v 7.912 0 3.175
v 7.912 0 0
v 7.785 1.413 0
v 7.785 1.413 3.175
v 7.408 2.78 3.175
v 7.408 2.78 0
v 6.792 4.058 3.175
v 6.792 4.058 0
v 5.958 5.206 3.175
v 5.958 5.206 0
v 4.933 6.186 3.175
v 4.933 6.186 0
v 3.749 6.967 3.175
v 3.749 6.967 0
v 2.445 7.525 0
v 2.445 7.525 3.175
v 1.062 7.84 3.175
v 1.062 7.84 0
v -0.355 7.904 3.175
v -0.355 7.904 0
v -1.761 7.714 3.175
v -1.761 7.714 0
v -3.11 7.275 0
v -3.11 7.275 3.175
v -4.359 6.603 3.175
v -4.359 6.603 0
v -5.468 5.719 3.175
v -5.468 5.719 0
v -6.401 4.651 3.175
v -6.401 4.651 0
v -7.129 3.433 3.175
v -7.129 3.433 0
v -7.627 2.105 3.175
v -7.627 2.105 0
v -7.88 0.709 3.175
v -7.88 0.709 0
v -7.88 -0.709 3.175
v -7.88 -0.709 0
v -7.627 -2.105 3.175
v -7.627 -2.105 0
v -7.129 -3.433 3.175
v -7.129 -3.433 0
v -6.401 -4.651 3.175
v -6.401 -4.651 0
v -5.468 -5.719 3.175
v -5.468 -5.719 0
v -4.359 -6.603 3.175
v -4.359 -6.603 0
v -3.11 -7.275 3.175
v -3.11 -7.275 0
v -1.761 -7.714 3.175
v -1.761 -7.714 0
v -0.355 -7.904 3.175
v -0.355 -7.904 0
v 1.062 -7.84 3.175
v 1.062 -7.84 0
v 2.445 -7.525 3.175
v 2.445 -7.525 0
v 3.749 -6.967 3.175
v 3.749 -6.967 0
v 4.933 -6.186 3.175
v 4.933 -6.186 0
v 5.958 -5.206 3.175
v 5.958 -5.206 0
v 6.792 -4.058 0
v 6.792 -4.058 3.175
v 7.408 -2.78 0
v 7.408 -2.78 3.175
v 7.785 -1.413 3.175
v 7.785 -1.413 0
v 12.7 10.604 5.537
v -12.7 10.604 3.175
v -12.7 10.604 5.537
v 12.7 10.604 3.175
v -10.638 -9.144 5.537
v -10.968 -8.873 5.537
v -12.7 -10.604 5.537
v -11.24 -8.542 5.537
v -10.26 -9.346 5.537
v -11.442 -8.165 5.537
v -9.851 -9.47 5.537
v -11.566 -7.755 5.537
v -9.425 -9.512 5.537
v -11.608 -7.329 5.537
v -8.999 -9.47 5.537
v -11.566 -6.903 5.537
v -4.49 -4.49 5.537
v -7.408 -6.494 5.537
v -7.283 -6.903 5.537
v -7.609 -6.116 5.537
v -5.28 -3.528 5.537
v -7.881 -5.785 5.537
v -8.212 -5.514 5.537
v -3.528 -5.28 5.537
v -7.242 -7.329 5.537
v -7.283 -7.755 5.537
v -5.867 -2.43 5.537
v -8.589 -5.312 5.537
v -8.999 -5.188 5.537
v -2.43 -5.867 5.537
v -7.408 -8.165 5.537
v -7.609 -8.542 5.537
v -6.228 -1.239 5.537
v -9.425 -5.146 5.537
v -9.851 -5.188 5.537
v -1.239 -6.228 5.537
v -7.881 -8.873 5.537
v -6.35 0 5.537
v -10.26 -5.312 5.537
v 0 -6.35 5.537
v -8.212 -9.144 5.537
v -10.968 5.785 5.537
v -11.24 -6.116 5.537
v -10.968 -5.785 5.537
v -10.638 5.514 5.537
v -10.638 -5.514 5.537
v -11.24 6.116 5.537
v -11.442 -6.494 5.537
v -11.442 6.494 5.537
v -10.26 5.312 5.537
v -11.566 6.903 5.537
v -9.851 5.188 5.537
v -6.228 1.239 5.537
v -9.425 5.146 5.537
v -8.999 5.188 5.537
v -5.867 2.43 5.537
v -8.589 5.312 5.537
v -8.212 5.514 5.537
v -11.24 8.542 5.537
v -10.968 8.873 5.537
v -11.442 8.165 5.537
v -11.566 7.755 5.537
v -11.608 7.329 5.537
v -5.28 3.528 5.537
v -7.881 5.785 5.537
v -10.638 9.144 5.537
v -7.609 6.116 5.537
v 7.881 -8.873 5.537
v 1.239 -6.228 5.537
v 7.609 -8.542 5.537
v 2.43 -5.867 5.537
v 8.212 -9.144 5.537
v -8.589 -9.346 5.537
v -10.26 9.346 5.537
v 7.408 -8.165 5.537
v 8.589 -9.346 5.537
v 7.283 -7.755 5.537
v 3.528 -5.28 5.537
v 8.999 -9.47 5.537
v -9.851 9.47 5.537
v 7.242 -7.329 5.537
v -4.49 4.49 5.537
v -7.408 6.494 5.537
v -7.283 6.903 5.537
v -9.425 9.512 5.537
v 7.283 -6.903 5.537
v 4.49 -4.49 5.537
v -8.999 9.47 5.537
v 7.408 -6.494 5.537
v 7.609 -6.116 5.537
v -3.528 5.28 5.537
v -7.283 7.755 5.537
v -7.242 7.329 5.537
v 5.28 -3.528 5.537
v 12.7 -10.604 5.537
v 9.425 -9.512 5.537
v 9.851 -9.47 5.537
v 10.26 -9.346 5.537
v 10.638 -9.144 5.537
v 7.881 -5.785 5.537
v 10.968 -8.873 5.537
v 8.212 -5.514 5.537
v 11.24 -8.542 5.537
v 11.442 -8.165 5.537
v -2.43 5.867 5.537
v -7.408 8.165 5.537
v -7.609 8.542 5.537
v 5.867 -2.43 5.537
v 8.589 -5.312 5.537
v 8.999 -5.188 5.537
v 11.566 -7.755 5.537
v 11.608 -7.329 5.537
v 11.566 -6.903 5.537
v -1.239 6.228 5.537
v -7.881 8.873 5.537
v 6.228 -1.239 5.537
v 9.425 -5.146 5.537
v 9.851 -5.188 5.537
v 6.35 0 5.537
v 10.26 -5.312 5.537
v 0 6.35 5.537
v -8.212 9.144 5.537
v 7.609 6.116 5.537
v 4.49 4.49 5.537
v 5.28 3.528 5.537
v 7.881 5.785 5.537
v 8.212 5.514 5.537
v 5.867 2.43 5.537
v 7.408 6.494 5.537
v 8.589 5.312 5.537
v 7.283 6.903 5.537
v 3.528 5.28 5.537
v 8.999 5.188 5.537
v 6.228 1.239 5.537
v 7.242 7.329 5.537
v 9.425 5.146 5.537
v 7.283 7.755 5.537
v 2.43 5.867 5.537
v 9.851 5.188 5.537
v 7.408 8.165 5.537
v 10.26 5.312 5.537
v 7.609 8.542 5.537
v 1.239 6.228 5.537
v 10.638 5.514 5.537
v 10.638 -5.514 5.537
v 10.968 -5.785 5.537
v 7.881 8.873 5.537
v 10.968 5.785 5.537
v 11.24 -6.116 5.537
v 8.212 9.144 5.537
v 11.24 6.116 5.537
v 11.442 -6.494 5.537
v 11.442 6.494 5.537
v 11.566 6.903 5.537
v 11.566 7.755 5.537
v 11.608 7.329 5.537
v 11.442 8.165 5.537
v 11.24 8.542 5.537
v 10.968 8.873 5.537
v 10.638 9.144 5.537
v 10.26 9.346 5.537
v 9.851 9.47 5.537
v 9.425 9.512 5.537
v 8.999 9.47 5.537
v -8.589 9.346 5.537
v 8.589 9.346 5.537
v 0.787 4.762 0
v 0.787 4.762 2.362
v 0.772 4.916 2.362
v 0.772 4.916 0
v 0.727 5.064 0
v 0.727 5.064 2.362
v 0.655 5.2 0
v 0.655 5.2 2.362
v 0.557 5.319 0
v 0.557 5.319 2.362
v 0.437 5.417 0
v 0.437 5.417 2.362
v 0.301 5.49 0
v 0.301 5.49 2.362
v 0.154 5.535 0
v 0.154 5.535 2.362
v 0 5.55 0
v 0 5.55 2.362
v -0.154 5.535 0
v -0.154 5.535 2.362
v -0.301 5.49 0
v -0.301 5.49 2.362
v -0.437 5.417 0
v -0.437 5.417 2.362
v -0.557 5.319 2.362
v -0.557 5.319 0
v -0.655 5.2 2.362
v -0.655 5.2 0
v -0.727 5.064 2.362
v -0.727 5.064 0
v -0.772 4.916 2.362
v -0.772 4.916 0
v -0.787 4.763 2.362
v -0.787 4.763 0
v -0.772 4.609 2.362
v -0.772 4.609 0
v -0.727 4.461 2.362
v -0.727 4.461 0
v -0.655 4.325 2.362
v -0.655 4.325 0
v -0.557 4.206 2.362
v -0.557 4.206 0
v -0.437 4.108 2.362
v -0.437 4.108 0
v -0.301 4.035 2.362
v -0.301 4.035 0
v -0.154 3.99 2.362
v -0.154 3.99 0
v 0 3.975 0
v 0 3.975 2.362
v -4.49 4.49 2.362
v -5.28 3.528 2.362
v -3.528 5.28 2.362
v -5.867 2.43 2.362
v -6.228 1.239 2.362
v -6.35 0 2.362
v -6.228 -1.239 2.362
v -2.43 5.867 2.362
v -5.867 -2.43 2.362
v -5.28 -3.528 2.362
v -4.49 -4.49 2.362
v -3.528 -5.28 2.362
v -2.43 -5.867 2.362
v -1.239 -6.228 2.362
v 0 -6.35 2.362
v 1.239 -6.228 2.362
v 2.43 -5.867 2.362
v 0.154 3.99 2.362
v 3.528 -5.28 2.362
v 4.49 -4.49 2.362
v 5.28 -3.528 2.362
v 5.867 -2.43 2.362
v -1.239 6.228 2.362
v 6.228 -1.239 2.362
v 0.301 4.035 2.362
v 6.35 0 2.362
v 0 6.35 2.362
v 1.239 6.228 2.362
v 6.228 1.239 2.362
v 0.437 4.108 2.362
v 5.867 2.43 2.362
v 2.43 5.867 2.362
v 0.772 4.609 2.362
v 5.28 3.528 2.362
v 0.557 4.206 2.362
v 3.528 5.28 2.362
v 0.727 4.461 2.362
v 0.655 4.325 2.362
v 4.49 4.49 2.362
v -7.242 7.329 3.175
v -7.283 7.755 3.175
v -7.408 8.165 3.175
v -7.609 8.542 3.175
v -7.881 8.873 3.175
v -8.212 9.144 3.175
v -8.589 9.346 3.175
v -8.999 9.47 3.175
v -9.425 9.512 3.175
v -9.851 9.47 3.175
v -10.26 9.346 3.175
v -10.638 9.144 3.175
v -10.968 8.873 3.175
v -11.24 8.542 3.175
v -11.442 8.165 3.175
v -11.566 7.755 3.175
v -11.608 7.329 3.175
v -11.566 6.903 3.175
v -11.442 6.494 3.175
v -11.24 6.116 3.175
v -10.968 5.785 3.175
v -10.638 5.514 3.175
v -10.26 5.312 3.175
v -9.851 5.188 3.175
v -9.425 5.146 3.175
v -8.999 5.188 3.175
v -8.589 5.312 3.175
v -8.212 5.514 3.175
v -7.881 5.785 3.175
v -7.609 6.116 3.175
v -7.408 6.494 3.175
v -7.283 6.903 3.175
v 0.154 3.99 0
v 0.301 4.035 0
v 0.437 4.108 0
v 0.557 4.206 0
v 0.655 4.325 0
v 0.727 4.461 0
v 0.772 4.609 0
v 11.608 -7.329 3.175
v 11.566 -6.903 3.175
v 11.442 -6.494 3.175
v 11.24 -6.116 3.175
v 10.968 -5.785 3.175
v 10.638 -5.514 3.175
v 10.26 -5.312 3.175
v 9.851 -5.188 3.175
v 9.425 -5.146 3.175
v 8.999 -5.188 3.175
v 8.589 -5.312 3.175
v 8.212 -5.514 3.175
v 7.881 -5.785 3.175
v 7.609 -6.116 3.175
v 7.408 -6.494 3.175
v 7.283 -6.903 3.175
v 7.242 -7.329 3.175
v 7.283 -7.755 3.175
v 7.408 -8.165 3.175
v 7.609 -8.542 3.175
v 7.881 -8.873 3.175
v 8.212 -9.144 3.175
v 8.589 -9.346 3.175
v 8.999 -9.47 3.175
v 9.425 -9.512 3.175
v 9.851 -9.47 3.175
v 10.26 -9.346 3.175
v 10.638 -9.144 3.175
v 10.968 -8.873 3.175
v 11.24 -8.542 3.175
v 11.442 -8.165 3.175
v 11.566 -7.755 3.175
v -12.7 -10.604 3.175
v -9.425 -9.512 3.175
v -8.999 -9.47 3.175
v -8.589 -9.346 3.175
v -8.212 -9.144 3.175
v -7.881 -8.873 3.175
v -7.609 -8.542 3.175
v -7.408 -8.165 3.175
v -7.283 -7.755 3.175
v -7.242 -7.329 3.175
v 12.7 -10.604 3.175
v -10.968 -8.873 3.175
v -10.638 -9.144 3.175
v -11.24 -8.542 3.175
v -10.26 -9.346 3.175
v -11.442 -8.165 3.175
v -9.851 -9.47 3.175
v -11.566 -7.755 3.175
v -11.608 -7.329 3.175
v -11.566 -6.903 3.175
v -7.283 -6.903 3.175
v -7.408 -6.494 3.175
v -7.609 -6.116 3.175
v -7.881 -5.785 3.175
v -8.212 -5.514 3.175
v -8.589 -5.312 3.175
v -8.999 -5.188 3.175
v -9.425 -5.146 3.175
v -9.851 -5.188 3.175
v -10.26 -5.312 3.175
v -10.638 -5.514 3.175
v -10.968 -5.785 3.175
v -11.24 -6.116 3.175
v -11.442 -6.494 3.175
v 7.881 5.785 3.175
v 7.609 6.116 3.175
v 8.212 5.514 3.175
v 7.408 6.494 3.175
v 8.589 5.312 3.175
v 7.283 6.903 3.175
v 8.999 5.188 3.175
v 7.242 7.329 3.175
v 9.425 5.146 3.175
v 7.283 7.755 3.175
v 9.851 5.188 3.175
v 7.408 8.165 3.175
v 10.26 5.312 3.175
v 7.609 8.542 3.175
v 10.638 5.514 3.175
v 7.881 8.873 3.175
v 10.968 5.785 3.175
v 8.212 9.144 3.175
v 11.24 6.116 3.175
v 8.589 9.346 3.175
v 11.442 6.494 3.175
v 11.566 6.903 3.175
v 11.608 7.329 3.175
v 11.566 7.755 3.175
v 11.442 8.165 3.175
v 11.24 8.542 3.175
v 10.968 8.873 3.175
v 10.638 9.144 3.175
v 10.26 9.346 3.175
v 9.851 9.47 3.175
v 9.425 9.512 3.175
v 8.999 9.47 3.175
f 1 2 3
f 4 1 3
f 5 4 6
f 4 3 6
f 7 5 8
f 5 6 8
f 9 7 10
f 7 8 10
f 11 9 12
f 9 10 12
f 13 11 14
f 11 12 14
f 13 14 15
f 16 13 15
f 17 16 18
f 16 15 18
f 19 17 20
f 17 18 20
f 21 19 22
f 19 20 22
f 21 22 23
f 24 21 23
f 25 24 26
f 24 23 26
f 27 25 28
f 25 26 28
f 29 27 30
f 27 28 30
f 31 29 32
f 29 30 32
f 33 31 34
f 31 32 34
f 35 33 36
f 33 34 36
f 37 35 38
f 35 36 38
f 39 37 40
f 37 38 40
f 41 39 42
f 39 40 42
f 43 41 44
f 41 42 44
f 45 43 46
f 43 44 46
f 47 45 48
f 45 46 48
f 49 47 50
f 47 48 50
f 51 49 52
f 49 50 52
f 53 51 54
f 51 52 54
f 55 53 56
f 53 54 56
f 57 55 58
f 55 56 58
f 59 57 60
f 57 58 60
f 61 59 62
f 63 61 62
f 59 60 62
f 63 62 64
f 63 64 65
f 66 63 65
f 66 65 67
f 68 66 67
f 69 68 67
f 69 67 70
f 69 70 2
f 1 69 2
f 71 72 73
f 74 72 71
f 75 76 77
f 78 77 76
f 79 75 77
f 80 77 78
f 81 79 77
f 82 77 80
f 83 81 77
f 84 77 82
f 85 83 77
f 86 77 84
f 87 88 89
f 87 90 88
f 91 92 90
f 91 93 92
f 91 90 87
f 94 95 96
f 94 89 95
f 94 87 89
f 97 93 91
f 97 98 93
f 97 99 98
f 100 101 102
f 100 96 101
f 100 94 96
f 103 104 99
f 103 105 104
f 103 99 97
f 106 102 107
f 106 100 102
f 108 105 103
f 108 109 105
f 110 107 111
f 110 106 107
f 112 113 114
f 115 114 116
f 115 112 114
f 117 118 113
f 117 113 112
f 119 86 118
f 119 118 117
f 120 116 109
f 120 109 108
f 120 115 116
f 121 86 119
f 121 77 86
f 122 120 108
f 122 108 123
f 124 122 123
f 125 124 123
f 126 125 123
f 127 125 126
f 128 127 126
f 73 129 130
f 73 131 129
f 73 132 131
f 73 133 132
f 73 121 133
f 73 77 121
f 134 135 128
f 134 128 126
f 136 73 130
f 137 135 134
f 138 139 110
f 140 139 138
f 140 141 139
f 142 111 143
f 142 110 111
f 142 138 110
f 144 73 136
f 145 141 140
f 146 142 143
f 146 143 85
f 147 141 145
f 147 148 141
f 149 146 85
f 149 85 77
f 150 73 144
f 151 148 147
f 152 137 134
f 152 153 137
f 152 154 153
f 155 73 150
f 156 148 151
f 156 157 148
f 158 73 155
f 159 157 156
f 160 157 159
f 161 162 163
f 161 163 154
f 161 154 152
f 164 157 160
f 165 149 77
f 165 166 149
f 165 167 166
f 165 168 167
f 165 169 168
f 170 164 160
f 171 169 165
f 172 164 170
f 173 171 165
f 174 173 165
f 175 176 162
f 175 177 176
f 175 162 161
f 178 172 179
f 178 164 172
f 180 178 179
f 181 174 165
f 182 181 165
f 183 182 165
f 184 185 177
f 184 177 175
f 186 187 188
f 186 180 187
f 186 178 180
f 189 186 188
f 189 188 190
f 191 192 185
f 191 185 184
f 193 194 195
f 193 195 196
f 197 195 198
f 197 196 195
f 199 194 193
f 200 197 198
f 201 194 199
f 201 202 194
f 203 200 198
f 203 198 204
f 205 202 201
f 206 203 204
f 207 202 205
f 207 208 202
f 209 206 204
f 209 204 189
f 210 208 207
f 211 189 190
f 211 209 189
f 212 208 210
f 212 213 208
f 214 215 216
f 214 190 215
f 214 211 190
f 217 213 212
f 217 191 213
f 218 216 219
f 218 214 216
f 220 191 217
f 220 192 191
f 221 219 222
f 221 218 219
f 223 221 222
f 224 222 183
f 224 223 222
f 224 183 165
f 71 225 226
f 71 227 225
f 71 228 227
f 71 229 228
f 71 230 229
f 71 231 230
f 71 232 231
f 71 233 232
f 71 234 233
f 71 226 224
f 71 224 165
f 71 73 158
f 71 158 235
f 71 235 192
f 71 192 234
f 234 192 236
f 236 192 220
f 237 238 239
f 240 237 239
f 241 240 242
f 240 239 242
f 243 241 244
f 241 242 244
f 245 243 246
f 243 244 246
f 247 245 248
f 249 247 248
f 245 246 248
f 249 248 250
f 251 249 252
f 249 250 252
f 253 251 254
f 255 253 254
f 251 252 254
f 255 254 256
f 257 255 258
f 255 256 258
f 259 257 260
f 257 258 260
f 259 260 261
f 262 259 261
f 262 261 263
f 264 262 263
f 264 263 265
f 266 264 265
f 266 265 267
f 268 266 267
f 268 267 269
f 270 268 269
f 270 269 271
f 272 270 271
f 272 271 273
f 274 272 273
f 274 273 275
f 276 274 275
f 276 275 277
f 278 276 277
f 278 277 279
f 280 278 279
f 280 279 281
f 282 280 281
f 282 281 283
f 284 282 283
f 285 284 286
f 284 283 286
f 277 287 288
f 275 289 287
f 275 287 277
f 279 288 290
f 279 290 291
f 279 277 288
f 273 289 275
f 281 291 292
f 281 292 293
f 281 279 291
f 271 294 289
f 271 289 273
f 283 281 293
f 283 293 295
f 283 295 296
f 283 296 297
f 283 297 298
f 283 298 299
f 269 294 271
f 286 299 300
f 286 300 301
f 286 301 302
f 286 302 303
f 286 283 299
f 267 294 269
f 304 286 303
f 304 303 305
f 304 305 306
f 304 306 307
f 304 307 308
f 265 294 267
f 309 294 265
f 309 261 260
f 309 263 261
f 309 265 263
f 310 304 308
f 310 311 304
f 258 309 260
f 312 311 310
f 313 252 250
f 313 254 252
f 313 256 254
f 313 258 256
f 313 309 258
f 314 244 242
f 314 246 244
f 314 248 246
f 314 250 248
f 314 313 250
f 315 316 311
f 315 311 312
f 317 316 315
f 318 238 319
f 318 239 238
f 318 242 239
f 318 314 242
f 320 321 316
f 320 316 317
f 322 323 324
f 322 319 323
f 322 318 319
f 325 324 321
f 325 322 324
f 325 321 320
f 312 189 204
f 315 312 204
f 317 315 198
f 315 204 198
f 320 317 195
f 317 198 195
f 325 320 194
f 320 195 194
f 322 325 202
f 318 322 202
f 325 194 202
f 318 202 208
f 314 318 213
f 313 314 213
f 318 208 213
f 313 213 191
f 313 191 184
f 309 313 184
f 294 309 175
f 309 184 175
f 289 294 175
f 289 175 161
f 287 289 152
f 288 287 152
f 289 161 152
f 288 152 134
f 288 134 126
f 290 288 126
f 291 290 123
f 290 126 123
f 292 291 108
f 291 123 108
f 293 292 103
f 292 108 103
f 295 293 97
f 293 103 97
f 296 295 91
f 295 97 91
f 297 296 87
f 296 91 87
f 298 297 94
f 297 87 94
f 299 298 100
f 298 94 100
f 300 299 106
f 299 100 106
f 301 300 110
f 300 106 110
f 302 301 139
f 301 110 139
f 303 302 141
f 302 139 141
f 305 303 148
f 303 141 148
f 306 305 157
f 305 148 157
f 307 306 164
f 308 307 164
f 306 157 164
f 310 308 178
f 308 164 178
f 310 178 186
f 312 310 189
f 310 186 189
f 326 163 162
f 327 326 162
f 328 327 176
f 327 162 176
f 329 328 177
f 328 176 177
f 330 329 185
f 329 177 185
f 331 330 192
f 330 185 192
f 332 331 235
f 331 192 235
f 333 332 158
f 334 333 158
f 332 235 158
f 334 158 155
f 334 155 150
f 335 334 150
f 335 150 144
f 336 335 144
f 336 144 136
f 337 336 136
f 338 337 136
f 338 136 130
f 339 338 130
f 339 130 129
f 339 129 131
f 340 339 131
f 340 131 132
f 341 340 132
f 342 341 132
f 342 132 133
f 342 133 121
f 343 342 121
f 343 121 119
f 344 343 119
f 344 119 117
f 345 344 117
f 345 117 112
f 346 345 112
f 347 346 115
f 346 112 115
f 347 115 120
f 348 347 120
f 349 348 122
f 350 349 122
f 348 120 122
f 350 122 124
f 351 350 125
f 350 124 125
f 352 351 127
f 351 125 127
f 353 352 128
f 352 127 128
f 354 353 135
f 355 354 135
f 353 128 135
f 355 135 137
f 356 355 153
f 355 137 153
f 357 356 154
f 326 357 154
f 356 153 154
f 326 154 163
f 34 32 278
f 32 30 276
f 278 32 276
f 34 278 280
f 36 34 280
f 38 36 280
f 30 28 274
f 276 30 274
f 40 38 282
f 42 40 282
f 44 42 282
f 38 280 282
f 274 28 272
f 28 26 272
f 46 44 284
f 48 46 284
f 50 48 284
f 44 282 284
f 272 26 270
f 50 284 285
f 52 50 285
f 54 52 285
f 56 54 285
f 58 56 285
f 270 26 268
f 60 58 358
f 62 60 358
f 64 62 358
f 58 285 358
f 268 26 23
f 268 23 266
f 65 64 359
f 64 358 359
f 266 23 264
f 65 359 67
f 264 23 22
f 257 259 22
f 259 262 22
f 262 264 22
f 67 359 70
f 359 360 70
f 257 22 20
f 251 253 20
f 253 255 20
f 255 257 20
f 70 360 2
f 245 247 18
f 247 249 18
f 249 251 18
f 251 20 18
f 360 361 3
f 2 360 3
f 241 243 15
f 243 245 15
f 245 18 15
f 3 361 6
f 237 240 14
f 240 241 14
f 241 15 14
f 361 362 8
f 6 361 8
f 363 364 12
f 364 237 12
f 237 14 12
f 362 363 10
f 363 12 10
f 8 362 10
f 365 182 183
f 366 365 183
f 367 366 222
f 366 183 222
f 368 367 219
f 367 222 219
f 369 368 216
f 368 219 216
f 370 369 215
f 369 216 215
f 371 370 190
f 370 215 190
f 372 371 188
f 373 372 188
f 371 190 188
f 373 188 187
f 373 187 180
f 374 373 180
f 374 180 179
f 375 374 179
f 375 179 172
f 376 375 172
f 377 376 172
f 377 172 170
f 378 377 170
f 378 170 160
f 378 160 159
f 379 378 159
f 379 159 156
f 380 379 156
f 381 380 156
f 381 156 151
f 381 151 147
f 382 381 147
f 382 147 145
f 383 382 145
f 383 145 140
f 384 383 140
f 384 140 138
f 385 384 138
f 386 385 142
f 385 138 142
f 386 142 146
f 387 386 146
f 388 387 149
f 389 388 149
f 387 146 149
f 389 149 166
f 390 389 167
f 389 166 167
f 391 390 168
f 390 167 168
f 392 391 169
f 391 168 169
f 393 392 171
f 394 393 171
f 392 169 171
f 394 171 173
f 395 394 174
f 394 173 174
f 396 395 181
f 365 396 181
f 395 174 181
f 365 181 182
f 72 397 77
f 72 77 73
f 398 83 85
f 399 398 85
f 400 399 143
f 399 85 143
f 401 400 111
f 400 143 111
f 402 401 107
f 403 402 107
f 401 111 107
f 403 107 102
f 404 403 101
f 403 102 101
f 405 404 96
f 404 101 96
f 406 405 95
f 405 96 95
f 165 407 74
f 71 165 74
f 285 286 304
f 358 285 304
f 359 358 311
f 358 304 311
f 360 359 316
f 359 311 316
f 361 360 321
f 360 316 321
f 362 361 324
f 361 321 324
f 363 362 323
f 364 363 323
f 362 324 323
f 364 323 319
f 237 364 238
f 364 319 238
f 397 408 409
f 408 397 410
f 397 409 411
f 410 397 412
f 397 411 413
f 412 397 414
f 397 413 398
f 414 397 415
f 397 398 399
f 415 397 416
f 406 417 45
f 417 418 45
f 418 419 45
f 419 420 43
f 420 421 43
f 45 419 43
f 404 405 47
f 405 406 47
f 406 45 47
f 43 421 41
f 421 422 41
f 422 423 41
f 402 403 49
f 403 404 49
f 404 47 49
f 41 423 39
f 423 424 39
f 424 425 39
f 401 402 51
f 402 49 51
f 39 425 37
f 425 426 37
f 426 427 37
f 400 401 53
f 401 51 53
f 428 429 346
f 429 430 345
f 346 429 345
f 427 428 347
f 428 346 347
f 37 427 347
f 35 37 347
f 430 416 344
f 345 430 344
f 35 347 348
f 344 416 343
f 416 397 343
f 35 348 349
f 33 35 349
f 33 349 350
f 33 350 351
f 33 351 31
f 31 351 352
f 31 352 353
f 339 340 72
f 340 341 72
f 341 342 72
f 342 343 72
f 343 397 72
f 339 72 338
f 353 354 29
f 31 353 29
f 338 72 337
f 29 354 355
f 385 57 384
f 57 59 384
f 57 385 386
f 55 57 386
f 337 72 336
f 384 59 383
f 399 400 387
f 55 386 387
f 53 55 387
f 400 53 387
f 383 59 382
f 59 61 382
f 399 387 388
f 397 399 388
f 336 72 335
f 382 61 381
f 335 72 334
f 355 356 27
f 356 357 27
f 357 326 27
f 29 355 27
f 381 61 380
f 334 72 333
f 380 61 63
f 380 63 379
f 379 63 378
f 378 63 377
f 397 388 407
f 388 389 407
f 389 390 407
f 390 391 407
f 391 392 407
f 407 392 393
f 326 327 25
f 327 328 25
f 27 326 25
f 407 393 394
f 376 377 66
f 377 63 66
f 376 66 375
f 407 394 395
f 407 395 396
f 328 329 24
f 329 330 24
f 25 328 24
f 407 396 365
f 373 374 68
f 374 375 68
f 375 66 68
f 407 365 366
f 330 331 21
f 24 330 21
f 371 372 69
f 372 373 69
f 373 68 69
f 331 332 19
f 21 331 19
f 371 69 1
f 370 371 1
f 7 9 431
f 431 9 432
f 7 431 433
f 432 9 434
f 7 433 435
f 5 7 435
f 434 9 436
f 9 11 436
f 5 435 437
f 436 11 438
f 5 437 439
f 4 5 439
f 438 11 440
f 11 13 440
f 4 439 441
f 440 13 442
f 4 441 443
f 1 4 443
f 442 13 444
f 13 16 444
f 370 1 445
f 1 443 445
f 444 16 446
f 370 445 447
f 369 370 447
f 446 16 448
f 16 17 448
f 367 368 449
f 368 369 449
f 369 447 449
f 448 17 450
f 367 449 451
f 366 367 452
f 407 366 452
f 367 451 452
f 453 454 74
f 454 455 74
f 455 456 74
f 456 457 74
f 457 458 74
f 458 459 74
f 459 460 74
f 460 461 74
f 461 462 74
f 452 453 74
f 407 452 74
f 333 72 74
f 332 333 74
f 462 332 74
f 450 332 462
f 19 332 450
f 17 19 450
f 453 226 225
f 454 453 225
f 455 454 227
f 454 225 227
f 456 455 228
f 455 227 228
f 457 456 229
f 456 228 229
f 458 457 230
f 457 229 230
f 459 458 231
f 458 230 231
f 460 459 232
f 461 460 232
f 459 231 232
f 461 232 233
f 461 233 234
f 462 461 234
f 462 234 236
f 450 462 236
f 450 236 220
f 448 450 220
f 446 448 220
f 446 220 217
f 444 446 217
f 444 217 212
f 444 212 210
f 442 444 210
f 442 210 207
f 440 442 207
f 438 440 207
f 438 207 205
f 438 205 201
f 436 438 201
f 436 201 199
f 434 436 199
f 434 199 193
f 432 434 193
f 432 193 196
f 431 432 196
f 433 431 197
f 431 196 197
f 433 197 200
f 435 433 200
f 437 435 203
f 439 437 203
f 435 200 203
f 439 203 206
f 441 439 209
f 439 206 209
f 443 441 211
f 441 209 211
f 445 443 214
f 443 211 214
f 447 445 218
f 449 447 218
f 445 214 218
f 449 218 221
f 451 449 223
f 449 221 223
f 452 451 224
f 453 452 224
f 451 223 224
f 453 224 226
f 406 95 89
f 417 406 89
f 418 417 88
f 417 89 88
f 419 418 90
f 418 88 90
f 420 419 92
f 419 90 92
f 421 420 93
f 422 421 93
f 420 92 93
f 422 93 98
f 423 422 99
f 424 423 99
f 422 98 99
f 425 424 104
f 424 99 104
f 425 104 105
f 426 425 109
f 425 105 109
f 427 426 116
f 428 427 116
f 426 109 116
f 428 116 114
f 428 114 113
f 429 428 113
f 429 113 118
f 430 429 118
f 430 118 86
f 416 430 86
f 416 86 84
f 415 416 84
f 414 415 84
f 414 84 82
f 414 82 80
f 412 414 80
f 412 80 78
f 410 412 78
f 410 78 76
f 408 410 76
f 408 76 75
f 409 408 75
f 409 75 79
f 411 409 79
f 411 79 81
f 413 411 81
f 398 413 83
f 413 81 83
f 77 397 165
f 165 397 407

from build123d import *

# Parameters (mm, degrees)
F0_R     = 7.9121
F1_DEPTH = 3.175
F2_W     = 25.4
F2_H     = 21.209
F3_DEPTH = 2.3622
F4_R     = 6.35
F5_DEPTH = 3.175
F7_DEPTH = 2.3632
F8_R     = 2.18313
F9_DEPTH = 5.5382


with BuildPart() as f1:
    # F0 (on Top) → F1 (new body)
    with BuildSketch(Plane.XY):
        Circle(F0_R)
    extrude(amount=F1_DEPTH)

    # F2 (on face) → F3 (join)
    with BuildSketch(Plane.XY.offset(3.175)):
        Rectangle(F2_W, F2_H)
    extrude(amount=F3_DEPTH)

    # F4 (on face) → F5 (cut)
    with BuildSketch(Plane.XY.offset(5.5372)):
        Circle(F4_R)
    extrude(amount=-F5_DEPTH, mode=Mode.SUBTRACT)

    # F6 (on face) → F7 (cut, through all)
    with BuildSketch(Plane.XY.offset(2.3622)):
        with BuildLine():
            ThreePointArc((0, 3.9751), (0.556776, 4.205724), (0.7874, 4.7625))
            ThreePointArc((0.7874, 4.7625), (-0.556776, 5.319276), (0, 3.9751))
        make_face()
    extrude(amount=-F7_DEPTH, mode=Mode.SUBTRACT)

    # F8 (on face) → F9 (cut, through all)
    with BuildSketch(Plane.XY.offset(5.5372)):
        with Locations((9.42467, 7.32917)):
            Circle(F8_R)
        with BuildLine():
            ThreePointArc((-11.6078, 7.32917), (-9.42467, 5.14604), (-7.24154, 7.32917))
            ThreePointArc((-7.24154, 7.32917), (-9.42467, 9.5123), (-11.6078, 7.32917))
        make_face()
        with BuildLine():
            ThreePointArc((-9.42467, -9.5123), (-7.880964, -8.872876), (-7.24154, -7.32917))
            ThreePointArc((-7.24154, -7.32917), (-10.968376, -5.785464), (-9.42467, -9.5123))
        make_face()
        with Locations((9.42467, -7.32917)):
            Circle(F8_R)
    extrude(amount=-F9_DEPTH, mode=Mode.SUBTRACT)


solid = f1.part
